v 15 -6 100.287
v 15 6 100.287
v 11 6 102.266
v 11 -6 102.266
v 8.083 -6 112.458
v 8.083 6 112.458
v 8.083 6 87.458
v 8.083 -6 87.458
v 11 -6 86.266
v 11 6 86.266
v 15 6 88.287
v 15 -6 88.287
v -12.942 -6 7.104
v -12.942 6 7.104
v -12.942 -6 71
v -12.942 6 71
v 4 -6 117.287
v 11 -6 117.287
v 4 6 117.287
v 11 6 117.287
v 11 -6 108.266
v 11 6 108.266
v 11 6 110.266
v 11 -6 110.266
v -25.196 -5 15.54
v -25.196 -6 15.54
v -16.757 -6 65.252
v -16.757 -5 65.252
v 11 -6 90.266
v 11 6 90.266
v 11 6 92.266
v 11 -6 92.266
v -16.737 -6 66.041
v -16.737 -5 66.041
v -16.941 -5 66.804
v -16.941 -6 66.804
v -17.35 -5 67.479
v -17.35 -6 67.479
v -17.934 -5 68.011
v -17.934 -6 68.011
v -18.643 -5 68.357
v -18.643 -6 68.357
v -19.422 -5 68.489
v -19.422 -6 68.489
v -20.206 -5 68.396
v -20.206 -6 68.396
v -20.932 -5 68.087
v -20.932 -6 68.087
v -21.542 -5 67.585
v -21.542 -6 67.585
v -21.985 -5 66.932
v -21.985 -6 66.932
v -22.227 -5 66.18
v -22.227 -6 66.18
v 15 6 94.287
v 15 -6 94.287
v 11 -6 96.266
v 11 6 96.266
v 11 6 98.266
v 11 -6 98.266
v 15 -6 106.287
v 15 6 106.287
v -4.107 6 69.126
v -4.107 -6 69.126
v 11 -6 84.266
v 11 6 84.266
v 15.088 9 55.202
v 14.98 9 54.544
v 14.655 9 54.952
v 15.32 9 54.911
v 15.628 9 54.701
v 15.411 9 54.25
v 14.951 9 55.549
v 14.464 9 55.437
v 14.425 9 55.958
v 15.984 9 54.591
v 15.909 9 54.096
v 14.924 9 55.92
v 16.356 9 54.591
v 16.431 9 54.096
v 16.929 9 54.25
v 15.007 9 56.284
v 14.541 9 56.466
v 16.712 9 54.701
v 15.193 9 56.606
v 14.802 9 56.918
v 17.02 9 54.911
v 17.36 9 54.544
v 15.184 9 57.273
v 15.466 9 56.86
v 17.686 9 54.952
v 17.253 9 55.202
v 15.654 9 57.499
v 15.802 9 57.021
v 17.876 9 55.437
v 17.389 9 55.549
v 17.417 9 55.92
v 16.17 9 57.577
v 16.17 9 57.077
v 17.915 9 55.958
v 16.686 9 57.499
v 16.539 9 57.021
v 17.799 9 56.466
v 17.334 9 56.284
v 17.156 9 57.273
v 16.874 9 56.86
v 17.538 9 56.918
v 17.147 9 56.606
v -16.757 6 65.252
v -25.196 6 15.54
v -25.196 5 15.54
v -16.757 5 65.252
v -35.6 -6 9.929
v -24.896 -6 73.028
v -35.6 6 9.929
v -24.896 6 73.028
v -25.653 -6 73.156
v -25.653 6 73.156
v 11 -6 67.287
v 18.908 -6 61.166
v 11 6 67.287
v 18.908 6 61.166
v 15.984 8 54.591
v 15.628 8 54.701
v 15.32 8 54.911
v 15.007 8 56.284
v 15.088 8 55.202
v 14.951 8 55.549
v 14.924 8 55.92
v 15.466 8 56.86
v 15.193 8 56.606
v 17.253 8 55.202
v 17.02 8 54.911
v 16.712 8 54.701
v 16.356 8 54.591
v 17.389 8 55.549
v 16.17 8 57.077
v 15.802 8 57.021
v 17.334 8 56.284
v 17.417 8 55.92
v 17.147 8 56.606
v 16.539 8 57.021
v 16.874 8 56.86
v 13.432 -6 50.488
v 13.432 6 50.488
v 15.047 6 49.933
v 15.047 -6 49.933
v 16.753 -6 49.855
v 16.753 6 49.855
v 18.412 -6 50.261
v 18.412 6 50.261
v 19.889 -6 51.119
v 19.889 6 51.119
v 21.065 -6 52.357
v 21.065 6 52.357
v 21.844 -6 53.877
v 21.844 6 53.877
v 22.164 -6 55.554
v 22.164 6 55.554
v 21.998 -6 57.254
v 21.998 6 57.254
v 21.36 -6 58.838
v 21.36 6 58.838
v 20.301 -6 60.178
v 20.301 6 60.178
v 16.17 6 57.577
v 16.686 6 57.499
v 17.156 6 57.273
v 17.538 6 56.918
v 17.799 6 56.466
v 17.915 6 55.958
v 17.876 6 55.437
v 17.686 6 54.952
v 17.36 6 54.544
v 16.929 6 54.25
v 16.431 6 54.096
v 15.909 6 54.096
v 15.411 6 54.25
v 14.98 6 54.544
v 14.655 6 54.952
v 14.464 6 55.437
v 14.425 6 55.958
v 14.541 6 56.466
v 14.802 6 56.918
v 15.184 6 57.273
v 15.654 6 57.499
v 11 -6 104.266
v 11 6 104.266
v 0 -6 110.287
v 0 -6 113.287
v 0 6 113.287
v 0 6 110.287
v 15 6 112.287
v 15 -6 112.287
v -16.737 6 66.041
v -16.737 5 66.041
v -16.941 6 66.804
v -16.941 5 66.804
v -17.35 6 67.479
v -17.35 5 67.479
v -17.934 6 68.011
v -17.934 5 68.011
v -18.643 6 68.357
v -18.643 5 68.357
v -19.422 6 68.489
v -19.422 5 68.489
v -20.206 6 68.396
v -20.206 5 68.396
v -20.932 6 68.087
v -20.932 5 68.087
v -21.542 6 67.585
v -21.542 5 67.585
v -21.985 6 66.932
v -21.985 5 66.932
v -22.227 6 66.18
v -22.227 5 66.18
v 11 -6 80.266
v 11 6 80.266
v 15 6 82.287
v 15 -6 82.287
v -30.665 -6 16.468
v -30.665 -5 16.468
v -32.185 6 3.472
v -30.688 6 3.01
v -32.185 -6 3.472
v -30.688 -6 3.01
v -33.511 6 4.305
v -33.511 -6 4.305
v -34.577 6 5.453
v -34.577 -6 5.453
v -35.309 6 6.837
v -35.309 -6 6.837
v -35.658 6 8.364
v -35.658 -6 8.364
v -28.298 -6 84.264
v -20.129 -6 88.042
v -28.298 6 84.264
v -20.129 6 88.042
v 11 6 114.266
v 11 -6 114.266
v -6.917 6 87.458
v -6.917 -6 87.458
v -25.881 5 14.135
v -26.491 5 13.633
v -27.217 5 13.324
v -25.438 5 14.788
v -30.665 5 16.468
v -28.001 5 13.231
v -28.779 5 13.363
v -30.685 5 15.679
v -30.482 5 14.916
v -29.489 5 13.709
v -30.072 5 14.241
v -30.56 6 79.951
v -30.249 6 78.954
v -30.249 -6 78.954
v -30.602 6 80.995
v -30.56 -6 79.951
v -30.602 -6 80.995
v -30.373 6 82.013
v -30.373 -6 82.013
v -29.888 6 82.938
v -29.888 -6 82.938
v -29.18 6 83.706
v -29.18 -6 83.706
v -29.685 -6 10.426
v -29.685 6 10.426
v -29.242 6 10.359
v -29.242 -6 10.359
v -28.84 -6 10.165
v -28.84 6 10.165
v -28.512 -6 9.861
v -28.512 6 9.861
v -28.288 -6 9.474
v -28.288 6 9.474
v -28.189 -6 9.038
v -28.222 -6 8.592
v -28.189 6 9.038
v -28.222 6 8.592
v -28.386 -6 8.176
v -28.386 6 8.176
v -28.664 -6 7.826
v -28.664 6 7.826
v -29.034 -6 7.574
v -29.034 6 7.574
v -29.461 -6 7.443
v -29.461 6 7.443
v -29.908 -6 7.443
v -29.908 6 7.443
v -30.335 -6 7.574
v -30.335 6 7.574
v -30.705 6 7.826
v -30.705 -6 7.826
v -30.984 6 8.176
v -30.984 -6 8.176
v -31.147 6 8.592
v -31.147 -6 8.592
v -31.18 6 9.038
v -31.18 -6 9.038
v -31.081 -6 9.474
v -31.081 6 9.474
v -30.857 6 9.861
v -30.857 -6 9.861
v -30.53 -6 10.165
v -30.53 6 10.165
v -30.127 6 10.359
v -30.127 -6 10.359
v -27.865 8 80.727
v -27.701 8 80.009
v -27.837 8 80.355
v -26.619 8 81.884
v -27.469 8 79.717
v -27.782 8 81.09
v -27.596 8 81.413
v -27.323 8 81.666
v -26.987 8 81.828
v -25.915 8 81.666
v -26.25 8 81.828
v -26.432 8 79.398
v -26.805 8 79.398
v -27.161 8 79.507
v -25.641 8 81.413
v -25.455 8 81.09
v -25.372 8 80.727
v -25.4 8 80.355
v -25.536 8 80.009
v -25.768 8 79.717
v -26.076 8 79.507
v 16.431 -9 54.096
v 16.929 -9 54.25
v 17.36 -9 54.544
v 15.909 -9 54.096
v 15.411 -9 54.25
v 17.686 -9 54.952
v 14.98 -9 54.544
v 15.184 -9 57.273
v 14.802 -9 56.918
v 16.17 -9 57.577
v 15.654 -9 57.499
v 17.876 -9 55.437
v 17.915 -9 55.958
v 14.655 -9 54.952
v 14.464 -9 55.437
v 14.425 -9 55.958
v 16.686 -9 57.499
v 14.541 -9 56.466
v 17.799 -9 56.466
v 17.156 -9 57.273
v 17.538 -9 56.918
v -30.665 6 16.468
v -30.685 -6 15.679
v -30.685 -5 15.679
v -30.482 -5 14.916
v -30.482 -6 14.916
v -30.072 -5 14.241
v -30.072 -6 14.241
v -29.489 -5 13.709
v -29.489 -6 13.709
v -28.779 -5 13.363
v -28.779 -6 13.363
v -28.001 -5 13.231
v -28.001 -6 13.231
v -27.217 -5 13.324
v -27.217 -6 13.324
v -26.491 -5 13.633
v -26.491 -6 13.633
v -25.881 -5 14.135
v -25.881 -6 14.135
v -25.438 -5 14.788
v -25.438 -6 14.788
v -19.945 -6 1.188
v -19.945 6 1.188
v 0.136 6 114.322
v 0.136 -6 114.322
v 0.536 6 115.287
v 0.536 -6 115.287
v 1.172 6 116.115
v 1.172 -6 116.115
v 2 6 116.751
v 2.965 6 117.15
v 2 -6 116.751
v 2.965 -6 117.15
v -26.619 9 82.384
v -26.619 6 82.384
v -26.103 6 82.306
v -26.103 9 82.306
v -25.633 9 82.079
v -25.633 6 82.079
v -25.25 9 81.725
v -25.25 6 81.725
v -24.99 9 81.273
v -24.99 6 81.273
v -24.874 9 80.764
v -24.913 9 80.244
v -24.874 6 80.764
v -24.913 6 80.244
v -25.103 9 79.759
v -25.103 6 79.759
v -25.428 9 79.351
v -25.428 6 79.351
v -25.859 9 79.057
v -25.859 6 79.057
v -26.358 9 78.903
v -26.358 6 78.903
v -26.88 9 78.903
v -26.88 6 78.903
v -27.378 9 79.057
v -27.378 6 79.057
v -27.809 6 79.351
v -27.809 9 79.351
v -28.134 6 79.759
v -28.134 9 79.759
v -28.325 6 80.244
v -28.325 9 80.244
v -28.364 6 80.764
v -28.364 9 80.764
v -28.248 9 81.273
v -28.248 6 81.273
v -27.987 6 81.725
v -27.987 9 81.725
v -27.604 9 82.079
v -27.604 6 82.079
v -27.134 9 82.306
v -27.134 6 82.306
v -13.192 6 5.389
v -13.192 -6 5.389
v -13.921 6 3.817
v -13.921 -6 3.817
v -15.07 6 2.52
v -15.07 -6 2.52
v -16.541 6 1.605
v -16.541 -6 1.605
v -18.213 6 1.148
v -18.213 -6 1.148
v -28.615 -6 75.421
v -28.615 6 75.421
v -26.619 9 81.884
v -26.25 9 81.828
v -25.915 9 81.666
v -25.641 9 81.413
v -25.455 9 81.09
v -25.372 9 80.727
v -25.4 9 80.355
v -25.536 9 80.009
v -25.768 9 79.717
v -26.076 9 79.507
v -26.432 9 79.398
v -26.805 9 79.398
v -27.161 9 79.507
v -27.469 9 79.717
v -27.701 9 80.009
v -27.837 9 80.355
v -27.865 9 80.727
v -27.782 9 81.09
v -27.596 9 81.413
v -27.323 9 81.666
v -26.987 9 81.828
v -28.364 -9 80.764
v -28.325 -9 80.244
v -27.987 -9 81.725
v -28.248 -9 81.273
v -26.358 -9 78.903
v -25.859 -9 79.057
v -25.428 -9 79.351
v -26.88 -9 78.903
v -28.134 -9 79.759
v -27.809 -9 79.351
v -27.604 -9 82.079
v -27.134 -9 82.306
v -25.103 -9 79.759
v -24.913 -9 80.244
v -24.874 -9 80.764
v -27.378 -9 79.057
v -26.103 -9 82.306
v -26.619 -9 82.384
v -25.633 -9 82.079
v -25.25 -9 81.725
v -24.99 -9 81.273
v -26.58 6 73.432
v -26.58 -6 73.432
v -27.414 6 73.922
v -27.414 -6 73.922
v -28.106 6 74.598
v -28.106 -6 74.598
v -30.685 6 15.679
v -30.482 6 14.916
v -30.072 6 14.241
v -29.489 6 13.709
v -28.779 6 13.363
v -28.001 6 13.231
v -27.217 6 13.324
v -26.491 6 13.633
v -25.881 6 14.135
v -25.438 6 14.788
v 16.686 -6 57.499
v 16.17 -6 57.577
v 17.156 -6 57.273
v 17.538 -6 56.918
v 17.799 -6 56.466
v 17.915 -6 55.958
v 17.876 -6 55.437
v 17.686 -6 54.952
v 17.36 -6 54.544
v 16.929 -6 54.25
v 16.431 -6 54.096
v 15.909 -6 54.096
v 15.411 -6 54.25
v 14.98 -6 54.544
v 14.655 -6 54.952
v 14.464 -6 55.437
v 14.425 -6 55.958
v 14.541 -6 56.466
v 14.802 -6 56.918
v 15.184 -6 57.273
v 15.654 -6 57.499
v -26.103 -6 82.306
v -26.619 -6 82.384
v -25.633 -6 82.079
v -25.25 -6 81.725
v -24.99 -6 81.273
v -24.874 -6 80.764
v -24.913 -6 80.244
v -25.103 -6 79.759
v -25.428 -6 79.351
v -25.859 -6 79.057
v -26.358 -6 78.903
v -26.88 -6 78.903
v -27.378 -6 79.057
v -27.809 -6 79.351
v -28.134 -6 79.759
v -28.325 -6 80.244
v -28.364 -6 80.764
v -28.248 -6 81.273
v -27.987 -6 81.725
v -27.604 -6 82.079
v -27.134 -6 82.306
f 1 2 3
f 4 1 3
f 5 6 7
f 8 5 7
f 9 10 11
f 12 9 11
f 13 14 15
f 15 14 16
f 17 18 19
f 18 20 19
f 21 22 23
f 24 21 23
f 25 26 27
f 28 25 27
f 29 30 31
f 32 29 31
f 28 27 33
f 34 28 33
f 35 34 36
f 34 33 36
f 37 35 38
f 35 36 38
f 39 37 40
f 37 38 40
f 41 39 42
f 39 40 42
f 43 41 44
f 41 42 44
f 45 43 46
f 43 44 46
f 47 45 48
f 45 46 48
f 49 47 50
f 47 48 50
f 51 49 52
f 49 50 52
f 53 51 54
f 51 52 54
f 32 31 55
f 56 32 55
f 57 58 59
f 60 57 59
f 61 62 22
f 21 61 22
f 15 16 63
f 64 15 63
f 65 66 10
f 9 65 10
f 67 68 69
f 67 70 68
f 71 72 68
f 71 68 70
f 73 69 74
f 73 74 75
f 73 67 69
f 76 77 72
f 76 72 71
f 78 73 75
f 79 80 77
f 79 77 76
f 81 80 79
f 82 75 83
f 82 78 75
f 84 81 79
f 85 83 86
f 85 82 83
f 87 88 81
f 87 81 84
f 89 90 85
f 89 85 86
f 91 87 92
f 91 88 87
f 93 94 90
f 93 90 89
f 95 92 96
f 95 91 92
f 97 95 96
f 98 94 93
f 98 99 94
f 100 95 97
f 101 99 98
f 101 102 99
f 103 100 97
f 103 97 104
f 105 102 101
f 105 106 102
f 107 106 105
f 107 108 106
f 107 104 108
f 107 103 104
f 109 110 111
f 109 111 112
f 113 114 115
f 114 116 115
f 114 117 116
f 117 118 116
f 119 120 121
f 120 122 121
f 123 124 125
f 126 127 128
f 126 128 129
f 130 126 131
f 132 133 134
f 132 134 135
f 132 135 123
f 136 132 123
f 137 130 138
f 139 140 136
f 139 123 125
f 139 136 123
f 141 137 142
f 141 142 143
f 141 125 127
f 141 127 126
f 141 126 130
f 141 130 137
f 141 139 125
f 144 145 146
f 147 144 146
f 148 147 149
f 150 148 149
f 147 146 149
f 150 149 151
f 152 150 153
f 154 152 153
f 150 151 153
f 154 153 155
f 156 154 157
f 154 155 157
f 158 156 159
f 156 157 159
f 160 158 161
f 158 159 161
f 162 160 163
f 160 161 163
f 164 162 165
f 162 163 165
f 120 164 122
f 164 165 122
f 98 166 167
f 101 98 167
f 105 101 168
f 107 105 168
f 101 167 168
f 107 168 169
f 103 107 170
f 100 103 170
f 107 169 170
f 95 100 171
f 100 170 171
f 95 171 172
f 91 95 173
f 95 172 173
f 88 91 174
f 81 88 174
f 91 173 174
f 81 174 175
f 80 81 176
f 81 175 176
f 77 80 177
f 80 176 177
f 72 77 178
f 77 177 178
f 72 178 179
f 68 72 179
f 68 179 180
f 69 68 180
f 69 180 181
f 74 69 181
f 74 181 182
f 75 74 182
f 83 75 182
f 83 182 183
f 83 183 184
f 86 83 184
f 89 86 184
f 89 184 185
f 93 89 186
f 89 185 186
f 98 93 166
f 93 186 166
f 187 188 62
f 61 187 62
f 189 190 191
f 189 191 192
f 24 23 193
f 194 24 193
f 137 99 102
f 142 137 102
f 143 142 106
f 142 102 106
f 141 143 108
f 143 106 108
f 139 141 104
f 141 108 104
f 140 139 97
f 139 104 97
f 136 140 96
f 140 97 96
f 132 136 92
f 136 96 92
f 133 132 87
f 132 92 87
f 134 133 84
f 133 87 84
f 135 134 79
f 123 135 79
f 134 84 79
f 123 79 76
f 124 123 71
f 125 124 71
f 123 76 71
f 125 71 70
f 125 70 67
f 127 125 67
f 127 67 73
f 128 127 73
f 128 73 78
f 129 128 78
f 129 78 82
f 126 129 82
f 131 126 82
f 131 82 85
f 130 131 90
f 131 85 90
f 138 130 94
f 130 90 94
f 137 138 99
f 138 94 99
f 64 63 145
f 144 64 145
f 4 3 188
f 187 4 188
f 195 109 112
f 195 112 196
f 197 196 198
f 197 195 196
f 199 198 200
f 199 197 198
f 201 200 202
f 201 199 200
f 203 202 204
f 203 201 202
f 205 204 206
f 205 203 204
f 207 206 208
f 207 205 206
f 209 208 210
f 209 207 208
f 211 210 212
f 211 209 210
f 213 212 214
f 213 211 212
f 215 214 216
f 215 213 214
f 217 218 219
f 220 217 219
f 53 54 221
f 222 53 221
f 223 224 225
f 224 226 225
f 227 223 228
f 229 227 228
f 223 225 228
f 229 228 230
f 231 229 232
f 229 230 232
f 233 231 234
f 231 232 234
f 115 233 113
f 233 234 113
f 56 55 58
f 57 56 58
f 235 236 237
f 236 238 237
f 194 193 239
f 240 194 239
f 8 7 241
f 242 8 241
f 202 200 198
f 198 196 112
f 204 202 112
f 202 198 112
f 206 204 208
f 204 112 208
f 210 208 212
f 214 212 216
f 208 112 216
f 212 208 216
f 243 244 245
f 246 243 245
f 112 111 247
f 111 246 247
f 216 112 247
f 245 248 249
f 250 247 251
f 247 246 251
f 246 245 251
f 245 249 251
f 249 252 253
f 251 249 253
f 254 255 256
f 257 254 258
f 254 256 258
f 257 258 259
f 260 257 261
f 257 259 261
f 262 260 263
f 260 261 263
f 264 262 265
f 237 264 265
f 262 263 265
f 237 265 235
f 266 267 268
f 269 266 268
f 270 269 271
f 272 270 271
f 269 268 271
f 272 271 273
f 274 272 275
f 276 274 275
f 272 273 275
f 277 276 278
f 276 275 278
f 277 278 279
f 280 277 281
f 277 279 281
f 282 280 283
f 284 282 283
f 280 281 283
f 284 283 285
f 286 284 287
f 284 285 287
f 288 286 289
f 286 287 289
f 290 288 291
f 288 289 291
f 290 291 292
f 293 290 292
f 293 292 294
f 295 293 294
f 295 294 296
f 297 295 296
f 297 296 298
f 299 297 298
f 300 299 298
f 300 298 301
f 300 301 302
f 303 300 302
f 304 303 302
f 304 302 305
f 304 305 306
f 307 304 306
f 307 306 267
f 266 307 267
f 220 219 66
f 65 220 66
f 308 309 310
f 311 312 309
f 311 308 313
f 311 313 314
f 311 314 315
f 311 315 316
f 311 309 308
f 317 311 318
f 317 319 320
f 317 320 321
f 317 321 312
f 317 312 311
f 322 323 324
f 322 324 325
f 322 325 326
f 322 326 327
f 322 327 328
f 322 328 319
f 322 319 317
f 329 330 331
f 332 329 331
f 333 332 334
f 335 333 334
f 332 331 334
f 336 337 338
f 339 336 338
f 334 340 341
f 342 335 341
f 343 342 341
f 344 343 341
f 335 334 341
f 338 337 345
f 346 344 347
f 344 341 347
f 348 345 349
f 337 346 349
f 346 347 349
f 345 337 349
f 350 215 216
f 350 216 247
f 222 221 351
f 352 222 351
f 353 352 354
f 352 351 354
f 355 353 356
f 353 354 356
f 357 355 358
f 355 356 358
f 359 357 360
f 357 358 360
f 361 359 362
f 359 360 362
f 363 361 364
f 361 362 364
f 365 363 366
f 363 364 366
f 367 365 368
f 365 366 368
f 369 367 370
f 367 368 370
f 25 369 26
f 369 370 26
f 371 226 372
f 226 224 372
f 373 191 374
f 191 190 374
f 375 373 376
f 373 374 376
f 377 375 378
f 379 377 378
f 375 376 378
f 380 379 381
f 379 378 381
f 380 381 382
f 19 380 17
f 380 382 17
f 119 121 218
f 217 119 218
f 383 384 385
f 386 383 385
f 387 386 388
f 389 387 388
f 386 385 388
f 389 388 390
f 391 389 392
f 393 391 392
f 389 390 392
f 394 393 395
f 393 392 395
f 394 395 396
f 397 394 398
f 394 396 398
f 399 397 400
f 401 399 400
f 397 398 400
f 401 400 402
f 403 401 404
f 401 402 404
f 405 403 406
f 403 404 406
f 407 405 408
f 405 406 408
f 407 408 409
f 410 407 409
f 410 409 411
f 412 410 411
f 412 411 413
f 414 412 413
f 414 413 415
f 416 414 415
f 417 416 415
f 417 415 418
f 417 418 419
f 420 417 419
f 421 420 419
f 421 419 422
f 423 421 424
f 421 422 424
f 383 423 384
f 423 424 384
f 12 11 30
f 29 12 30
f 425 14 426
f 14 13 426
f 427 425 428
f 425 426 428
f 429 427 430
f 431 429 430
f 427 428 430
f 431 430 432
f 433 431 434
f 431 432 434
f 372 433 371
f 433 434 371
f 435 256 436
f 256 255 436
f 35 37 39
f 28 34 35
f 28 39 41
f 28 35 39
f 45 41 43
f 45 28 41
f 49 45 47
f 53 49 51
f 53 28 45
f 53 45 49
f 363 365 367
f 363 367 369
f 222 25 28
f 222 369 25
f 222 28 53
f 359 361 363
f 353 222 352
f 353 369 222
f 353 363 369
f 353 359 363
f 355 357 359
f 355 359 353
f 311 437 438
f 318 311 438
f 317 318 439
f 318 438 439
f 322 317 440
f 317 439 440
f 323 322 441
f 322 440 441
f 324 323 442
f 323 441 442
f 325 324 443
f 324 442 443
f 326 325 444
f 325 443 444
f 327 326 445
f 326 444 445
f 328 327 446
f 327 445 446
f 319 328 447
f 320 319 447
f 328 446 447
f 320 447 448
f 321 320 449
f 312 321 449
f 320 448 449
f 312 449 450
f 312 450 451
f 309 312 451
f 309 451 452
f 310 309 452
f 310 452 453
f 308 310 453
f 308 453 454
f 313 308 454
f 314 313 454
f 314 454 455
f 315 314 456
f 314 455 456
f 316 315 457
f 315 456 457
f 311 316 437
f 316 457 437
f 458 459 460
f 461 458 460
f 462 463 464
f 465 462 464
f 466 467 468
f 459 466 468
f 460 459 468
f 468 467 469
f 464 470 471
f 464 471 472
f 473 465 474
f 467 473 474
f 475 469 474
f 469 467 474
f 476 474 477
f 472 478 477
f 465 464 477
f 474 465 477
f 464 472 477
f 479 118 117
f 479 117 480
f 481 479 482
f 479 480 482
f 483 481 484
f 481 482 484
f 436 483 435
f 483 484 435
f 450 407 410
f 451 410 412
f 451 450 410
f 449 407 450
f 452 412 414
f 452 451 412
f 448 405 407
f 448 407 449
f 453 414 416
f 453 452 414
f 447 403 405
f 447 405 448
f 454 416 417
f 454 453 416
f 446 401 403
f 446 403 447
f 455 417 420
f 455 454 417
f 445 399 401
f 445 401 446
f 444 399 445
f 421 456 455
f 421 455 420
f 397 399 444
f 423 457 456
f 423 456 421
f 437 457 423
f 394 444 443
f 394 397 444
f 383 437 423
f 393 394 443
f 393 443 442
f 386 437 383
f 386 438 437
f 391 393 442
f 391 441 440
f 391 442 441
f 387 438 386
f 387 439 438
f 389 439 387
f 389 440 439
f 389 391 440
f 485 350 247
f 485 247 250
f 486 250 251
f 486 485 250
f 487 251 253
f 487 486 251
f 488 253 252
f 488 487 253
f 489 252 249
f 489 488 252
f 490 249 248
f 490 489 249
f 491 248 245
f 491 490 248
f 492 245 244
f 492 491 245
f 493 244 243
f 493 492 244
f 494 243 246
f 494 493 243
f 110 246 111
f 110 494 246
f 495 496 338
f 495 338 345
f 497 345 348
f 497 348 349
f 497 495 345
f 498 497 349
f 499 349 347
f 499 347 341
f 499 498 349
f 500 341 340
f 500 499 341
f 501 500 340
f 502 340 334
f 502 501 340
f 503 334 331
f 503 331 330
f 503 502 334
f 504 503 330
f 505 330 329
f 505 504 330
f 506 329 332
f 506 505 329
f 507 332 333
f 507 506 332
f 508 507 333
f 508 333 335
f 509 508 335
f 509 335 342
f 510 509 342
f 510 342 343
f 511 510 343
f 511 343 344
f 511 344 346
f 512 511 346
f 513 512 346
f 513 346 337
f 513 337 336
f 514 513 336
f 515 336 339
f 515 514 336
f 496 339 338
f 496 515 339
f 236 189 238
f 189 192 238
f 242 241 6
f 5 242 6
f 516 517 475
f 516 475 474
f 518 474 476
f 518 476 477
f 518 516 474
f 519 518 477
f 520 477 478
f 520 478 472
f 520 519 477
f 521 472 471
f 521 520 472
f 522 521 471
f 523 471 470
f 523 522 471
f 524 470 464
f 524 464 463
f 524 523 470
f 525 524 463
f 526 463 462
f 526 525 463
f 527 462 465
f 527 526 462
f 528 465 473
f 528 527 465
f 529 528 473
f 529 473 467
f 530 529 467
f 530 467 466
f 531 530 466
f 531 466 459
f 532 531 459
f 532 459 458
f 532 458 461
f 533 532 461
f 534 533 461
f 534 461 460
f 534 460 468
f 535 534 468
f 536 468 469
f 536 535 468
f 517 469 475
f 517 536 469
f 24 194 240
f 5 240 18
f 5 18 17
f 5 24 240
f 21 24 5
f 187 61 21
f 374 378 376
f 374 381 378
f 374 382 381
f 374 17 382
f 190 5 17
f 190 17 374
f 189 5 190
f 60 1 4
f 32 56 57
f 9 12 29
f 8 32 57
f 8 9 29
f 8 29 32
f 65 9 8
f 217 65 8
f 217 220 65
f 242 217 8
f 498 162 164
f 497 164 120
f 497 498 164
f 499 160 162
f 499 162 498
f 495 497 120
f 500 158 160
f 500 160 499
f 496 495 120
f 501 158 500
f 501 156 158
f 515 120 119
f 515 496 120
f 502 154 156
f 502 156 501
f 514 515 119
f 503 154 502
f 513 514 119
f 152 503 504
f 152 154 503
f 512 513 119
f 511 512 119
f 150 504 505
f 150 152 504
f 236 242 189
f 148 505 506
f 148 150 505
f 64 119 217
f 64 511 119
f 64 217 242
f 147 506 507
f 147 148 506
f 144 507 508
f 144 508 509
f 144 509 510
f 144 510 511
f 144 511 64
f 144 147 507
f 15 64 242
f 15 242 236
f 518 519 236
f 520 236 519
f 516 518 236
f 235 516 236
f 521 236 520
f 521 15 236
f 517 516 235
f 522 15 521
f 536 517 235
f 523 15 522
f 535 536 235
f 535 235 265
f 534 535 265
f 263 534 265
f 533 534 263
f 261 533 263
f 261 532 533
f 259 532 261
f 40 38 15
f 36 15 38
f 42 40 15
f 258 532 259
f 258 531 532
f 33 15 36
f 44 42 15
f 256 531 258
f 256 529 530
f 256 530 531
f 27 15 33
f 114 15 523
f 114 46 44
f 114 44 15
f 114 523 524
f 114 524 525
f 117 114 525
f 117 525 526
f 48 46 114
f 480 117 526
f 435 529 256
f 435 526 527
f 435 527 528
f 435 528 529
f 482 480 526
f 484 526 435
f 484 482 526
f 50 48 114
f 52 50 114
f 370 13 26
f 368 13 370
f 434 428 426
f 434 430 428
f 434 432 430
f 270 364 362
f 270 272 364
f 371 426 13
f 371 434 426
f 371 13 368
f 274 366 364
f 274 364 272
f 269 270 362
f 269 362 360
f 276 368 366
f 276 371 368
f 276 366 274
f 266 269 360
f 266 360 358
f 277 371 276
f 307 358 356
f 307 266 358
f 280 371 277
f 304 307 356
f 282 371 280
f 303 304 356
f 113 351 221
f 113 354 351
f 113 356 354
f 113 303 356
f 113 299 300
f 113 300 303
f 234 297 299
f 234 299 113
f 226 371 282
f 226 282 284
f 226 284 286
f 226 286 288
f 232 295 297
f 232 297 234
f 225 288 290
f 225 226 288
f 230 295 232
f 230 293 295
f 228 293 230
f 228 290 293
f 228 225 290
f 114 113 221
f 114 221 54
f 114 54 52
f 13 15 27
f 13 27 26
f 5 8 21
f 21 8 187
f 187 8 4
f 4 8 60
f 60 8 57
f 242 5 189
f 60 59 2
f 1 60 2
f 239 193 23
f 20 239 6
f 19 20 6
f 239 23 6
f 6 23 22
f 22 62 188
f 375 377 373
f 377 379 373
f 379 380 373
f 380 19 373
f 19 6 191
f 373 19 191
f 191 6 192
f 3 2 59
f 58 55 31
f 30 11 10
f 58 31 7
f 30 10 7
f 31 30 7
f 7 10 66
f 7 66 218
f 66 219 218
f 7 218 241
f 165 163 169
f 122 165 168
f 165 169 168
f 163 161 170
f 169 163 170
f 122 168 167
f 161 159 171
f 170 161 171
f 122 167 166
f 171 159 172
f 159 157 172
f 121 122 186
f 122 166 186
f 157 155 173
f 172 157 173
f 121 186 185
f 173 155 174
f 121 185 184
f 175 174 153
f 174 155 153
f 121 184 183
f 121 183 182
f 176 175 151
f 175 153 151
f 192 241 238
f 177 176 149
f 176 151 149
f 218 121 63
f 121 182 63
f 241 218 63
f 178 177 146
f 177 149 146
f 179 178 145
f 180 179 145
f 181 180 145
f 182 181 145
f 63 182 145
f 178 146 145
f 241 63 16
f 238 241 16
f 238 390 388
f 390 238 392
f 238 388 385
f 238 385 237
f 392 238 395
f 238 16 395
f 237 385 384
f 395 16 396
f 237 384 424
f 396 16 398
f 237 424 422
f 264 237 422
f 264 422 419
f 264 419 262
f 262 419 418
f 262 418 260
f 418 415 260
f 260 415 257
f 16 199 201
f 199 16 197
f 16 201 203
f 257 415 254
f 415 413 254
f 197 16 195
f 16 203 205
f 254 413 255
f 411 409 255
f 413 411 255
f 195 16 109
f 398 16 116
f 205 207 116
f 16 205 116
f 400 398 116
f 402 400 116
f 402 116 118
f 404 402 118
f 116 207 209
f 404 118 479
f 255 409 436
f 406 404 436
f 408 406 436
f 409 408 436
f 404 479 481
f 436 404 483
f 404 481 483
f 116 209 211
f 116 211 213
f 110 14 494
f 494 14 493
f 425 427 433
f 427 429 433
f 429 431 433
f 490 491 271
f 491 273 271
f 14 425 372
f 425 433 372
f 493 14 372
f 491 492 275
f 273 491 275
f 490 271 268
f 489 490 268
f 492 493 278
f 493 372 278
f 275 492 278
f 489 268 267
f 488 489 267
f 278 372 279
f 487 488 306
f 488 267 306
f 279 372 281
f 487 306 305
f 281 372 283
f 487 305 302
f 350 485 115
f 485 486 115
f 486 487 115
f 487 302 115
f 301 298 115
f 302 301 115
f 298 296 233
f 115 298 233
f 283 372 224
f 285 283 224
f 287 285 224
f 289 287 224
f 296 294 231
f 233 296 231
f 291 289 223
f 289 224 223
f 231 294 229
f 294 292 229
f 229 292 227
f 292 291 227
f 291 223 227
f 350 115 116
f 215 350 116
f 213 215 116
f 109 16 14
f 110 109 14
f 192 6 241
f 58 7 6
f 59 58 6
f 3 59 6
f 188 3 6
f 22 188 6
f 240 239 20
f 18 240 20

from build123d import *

# Parameters (mm, degrees)
BOSS_EXTRUDE1_DEPTH = 6
FILLET1_R           = 6
FILLET2_R           = 4
BOSS_EXTRUDE2_DEPTH = 12
LPATTERN1_COUNT     = 6
LPATTERN1_PITCH     = 6
CUT_EXTRUDE1_DEPTH  = 26
SKETCH5_R           = 1.5
CUT_EXTRUDE4_DEPTH  = 124.180869367
SKETCH6_R           = 1.75
BOSS_EXTRUDE3_DEPTH = 3
SKETCH7_R           = 1.25
CUT_EXTRUDE6_DEPTH  = 1
SKETCH8_R           = 1.25
CUT_EXTRUDE7_DEPTH  = 1
CUT_EXTRUDE8_DEPTH  = 1


with BuildPart() as part:
    # Sketch1 → Boss-Extrude1 (new, symmetric)
    with BuildSketch(Plane(origin=(0, 0, 0), x_dir=(1, 0, 0), z_dir=(0, 1, 0))):
        with BuildLine():
            ThreePointArc((13.432245527, -50.487906924), (21.509028276, -53.088979862), (18.907955338, -61.165762611))
            Line((18.907955338, -61.165762611), (11, -67.286566673))
            Line((11, -67.286566673), (11, -117.286566673))
            Line((11, -117.286566673), (0, -117.286566673))
            Line((0, -117.286566673), (0, -110.286566673))
            Line((0, -110.286566673), (-20.129396013, -88.042299634))
            Line((-20.129396013, -88.042299634), (-31.928362438, -82.58479184))
            Line((-31.928362438, -82.58479184), (-27.730279519, -73.508663821))
            Line((-27.730279519, -73.508663821), (-24.896421124, -73.027946621))
            Line((-24.896421124, -73.027946621), (-12.941547125, -71))
            Line((-12.941547125, -71), (-4.10711559, -69.126148868))
            Line((-4.10711559, -69.126148868), (13.432245527, -50.487906924))
        make_face()
        Polygon((-12.941547125, -71), (-24.896421124, -73.027946621), (-36.603518956, -4.013862114), (-12.941547125, 0), align=None)
    extrude(amount=BOSS_EXTRUDE1_DEPTH, both=True)

    # Fillet1
    fillet1_edges = [part.edges().sort_by_distance(p)[0] for p in [
        (-36.603518956, 0, 4.013862114),
        (-12.941547125, 0, 0),
    ]]
    fillet(fillet1_edges, radius=FILLET1_R)

    # Fillet2
    fillet2_edges = [part.edges().sort_by_distance(p)[0] for p in [
        (0, 0, 117.286566673),
        (-31.928362438, 0, 82.58479184),
        (-27.730279519, 0, 73.508663821),
    ]]
    fillet(fillet2_edges, radius=FILLET2_R)

    # Sketch2 → Boss-Extrude2 (add)
    with BuildSketch(Plane(origin=(0, 6, 0), x_dir=(1, 0, 0), z_dir=(0, 1, 0))):
        Polygon((15, -112.286566673), (11, -114.265571656), (11, -110.265571656), align=None)
    boss_extrude2 = extrude(amount=-BOSS_EXTRUDE2_DEPTH)

    # LPattern1: Boss-Extrude2 ×6
    with Locations(*[(0, 0, -i * LPATTERN1_PITCH) for i in range(1, LPATTERN1_COUNT)]):
        add(boss_extrude2)

    # Sketch3 → Cut-Extrude1 (cut)
    with BuildSketch(Plane(origin=(0, 6, 0), x_dir=(1, 0, 0), z_dir=(0, 1, 0))):
        Polygon((8.082911966, -112.457569416), (8.082911966, -87.457569416), (-6.917088034, -87.457569416), align=None)
    extrude(amount=-CUT_EXTRUDE1_DEPTH, mode=Mode.SUBTRACT)

    # Sketch5 → Cut-Extrude4 (cut, through all)
    with BuildSketch(Plane(origin=(0, 6, 0), x_dir=(1, 0, 0), z_dir=(0, 1, 0))):
        with Locations(Location((-29.68456047, -8.925889543, 0), (0, 0, 270))):
            Circle(SKETCH5_R)
    extrude(amount=-CUT_EXTRUDE4_DEPTH, mode=Mode.SUBTRACT)

    # Sketch6 → Boss-Extrude3 (add)
    with BuildSketch(Plane(origin=(0, 6, 0), x_dir=(1, 0, 0), z_dir=(0, 1, 0))):
        with Locations(Location((-26.618678063, -80.6335738, 0), (0, 0, 270))):
            Circle(SKETCH6_R)
        with Locations(Location((16.170100432, -55.826834767, 0), (0, 0, 270))):
            Circle(SKETCH6_R)
    boss_extrude3 = extrude(amount=BOSS_EXTRUDE3_DEPTH)

    # Sketch7 → Cut-Extrude6 (cut)
    with BuildSketch(Plane(origin=(0, 9, 0), x_dir=(1, 0, 0), z_dir=(0, 1, 0))):
        with Locations(Location((-26.618678063, -80.6335738, 0), (0, 0, 270))):
            Circle(SKETCH7_R)
    extrude(amount=-CUT_EXTRUDE6_DEPTH, mode=Mode.SUBTRACT)

    # Sketch8 → Cut-Extrude7 (cut)
    with BuildSketch(Plane(origin=(0, 9, 0), x_dir=(1, 0, 0), z_dir=(0, 1, 0))):
        with Locations(Location((16.170100432, -55.826834767, 0), (0, 0, 270))):
            Circle(SKETCH8_R)
    extrude(amount=-CUT_EXTRUDE7_DEPTH, mode=Mode.SUBTRACT)

    # Sketch9 → Cut-Extrude8 (cut)
    with BuildSketch(Plane(origin=(0, 6, 0), x_dir=(1, 0, 0), z_dir=(0, 1, 0))):
        with BuildLine():
            Line((-25.196199852, -15.539852581), (-16.757464085, -65.251677823))
            ThreePointArc((-16.757464085, -65.251677823), (-19.027845143, -68.450467492), (-22.226634811, -66.180086434))
            Line((-22.226634811, -66.180086434), (-30.665370577, -16.468261192))
            ThreePointArc((-30.665370577, -16.468261192), (-28.39498952, -13.269471524), (-25.196199852, -15.539852581))
        make_face()
    cut_extrude8 = extrude(amount=-CUT_EXTRUDE8_DEPTH, mode=Mode.SUBTRACT)

    # Mirror1: Boss-Extrude3, Cut-Extrude8 across plane
    add(boss_extrude3.mirror(Plane.ZX))
    add(cut_extrude8.mirror(Plane.ZX), mode=Mode.SUBTRACT)


solid = part.part
